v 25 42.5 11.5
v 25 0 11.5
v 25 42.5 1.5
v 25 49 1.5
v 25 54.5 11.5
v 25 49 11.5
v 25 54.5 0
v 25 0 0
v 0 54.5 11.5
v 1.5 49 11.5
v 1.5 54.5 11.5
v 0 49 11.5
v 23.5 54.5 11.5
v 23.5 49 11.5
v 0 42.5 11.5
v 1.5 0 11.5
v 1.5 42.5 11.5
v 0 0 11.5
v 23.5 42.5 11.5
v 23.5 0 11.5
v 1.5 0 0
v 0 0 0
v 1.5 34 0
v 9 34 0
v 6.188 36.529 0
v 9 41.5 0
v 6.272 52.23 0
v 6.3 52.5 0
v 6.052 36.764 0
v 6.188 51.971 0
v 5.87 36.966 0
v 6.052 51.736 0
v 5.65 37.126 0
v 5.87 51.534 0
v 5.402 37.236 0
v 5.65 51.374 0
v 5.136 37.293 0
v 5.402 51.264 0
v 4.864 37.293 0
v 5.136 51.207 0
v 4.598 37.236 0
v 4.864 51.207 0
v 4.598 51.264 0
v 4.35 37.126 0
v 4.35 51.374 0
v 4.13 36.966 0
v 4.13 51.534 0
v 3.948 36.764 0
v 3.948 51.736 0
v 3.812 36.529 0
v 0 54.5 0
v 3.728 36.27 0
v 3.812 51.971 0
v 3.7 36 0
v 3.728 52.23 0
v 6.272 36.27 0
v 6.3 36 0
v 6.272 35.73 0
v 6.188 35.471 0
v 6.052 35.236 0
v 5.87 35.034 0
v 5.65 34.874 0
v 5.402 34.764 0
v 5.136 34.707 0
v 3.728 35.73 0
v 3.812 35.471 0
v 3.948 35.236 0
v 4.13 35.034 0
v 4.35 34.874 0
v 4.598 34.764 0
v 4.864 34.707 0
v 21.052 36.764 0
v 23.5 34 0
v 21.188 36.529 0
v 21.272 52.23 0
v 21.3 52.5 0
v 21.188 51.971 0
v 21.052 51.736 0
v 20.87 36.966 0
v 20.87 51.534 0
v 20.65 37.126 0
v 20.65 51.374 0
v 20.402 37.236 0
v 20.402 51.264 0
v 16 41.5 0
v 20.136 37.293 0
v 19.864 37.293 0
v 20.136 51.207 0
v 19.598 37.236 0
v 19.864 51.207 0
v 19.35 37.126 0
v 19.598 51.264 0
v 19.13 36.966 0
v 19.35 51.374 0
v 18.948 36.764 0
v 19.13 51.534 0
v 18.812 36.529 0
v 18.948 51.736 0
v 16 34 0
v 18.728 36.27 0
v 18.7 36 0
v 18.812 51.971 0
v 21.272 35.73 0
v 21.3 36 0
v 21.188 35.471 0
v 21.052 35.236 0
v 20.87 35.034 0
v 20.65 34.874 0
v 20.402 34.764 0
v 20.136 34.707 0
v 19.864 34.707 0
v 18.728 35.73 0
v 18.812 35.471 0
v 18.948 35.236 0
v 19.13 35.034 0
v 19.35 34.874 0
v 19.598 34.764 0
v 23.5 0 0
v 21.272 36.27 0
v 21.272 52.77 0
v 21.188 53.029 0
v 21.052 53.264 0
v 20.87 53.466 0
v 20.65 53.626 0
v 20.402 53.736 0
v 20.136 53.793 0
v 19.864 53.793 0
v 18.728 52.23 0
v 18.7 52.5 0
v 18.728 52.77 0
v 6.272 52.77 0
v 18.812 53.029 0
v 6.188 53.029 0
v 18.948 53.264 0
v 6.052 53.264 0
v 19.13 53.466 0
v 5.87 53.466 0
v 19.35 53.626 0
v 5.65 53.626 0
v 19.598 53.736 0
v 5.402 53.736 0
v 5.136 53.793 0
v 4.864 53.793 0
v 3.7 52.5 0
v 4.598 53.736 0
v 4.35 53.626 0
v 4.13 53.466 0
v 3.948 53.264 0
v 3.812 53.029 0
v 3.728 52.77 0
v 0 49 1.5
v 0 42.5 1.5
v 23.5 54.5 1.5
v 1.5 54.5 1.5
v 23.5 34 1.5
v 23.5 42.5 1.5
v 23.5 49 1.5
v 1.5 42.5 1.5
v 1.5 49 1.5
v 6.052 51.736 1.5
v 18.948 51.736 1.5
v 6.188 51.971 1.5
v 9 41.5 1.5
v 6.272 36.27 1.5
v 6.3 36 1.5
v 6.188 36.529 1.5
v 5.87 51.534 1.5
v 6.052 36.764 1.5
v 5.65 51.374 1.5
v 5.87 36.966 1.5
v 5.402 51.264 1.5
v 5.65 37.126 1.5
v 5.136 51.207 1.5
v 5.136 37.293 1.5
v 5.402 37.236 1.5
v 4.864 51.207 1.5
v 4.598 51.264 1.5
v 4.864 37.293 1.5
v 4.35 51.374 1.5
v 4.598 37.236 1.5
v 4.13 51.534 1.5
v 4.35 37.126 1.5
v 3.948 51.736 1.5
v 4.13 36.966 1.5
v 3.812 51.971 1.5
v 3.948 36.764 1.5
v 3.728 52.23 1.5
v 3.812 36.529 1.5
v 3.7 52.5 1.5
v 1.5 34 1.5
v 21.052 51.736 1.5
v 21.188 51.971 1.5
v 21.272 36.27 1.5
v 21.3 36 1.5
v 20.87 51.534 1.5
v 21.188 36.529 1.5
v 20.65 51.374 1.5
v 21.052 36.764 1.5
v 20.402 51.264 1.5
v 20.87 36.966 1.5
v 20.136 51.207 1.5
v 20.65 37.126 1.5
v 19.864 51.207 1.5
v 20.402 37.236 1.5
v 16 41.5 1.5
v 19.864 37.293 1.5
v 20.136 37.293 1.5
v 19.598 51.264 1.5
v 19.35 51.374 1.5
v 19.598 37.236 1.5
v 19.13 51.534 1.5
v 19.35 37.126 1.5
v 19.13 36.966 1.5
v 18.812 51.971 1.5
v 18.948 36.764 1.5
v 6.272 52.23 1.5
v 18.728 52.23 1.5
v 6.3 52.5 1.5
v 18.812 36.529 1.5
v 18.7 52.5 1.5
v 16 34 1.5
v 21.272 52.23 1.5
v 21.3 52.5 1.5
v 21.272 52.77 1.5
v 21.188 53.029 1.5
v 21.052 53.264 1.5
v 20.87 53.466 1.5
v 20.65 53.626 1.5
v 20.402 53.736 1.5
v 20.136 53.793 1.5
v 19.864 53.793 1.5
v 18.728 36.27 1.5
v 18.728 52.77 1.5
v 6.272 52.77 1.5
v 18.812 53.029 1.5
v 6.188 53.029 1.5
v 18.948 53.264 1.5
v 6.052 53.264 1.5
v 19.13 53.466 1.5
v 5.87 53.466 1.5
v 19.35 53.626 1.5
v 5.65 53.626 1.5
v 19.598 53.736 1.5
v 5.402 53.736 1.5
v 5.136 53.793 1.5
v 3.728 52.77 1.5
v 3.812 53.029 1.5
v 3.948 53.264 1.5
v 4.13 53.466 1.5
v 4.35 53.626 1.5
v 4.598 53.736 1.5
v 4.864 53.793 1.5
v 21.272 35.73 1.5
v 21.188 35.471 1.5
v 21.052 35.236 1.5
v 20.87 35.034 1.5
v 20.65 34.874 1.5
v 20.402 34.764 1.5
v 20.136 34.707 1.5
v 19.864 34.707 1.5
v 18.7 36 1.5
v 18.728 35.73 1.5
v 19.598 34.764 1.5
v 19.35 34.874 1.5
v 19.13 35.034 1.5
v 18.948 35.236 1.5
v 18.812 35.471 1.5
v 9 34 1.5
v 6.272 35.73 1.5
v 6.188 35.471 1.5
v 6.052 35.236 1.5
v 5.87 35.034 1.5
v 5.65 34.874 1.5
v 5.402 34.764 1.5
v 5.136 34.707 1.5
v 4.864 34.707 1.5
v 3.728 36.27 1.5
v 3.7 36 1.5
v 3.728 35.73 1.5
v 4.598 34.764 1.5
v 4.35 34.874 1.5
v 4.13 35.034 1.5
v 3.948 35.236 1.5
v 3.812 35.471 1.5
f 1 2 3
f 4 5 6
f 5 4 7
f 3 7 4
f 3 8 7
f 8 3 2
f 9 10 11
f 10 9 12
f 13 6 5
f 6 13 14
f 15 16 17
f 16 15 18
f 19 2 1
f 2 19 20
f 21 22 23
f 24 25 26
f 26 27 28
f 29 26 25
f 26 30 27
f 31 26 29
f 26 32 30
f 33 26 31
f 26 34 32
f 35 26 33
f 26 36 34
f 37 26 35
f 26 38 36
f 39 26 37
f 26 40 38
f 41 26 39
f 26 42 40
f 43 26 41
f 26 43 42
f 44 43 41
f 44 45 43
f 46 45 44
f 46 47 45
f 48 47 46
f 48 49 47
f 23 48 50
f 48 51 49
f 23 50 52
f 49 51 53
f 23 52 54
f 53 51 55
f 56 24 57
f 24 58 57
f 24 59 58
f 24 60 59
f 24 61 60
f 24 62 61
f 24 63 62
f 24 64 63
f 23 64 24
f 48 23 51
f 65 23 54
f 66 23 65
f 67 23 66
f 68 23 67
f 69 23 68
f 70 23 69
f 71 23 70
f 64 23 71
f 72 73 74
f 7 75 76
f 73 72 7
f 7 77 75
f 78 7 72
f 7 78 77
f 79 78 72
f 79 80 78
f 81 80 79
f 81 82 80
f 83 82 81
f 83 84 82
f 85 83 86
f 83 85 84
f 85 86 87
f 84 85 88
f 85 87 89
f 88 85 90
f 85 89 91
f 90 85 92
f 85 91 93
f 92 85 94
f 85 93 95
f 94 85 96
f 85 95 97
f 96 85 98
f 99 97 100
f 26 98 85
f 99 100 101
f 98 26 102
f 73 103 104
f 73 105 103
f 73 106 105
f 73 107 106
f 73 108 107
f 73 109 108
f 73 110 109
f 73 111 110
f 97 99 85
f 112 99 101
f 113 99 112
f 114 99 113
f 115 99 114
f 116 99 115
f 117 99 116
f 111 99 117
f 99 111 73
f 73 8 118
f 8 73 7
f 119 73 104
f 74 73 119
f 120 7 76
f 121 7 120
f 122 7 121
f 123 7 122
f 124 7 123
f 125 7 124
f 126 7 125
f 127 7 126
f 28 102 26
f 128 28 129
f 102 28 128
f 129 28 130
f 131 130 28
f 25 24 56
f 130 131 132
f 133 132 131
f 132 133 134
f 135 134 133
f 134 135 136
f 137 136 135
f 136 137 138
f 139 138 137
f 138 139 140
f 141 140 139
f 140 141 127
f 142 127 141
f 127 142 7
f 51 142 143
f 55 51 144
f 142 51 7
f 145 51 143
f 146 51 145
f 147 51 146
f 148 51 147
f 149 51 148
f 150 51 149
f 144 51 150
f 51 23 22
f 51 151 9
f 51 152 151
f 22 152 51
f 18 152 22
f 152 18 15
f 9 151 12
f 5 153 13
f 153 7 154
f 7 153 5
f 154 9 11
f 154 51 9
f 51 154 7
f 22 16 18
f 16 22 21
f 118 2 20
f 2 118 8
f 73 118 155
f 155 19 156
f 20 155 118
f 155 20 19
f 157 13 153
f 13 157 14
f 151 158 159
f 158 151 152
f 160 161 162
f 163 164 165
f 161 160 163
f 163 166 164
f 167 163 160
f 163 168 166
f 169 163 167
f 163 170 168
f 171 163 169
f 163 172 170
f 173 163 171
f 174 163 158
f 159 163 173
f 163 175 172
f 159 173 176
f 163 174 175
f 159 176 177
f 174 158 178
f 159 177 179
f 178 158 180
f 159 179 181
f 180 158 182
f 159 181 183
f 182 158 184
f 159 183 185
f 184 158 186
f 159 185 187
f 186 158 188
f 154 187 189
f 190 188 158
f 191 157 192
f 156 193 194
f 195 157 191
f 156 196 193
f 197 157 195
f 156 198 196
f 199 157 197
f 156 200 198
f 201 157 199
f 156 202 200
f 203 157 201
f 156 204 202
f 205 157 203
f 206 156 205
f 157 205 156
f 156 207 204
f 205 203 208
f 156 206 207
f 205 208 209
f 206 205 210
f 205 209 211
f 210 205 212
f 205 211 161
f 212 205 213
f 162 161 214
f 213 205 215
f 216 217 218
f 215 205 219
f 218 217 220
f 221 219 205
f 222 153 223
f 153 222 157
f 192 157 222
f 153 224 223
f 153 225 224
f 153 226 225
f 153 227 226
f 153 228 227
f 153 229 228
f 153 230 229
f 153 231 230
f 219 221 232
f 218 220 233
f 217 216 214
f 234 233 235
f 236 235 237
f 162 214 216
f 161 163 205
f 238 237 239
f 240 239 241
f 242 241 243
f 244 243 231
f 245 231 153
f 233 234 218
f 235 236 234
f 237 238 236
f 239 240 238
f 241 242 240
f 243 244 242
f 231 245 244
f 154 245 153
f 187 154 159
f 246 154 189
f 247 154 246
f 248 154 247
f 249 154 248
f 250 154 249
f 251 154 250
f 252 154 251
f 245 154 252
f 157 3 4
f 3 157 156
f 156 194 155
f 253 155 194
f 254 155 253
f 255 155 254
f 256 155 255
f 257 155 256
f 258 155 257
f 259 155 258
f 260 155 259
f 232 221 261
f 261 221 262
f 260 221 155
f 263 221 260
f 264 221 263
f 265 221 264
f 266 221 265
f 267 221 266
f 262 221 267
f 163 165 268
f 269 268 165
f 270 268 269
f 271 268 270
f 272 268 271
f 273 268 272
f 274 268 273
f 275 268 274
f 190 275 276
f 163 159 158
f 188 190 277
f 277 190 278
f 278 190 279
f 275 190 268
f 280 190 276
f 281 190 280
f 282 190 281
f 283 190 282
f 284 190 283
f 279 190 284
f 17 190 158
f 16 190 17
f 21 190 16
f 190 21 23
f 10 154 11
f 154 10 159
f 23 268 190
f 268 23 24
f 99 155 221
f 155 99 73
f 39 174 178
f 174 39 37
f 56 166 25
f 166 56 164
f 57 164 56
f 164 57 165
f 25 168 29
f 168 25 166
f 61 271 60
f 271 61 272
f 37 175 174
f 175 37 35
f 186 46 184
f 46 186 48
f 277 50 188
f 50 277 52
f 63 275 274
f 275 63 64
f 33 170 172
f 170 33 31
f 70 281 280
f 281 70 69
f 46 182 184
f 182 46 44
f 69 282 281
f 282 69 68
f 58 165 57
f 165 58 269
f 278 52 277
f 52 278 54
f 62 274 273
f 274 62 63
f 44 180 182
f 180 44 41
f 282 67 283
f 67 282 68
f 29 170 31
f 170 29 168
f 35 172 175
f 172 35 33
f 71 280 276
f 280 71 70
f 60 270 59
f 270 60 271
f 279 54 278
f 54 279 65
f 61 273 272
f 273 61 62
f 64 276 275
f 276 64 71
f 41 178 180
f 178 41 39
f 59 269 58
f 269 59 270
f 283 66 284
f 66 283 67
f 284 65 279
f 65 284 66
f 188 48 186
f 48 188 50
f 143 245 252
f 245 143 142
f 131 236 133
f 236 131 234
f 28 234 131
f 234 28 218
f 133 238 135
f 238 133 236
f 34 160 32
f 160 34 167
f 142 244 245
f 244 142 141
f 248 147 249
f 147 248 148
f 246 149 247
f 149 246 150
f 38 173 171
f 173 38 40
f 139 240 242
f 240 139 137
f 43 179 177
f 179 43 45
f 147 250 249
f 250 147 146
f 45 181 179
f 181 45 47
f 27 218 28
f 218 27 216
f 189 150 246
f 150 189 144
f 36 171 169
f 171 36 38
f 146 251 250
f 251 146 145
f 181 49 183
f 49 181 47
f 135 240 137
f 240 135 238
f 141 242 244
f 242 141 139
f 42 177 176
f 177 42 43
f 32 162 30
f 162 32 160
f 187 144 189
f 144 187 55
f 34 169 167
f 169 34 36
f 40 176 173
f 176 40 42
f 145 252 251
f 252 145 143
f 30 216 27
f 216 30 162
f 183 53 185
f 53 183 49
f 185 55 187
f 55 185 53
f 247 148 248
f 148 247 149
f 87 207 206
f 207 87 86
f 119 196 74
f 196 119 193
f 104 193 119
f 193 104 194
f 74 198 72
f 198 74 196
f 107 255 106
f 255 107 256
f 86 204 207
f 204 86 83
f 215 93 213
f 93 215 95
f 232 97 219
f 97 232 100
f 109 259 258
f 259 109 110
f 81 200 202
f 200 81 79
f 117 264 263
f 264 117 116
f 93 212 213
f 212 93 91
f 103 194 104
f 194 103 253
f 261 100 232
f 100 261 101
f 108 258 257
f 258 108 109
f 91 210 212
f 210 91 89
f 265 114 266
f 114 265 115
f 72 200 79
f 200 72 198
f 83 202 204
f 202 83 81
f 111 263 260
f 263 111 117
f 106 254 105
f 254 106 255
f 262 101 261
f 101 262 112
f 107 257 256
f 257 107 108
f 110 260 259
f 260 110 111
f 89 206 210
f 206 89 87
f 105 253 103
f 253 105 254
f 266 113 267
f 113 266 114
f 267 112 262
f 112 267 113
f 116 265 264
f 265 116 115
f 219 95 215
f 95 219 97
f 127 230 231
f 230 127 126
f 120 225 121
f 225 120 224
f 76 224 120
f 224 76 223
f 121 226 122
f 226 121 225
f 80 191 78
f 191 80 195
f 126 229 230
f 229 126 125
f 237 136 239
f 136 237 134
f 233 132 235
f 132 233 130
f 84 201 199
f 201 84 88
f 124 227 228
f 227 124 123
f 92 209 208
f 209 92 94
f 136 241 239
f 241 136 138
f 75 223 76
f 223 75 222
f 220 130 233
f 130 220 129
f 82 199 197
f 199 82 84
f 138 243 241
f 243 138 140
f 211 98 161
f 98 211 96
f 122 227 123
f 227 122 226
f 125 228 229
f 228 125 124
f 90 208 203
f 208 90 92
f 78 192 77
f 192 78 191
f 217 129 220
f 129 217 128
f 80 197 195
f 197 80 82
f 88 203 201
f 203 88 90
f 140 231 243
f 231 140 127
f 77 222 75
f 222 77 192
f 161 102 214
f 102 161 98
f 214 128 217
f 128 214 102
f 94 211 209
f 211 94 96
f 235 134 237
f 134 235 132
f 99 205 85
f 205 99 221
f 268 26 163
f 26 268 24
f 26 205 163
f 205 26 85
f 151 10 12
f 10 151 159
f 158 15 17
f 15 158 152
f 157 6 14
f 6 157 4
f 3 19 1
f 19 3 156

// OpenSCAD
pro_micro_house_w_x = 22;
pro_micro_house_w_y = 54;
pro_micro_house_gpio_area_w_y = 34;

padding_x = 1.5;
padding_y_t = 0.5;
padding_z_t = 1.5;
padding_z_b = 1.5;

pro_micro_house_h = 1.5;
spacer_h = 7;

spacer_l_x = 3.5;
spacer_r_x = 18.5;
spacer_b_y = 36;
spacer_t_y = 52.5;
spacer_r = 1.3;

spacer_scale_inverse = 10;

trrs_y = 42.5;
trrs_w_y = 6.5;
trrs_h = 6.5;

reset_switch_x = 7.5;
reset_switch_y = 34;
reset_switch_w_x = 7;
reset_switch_w_y = 7.5;

pro_micro_house_case();

module pro_micro_house_case() {
    difference() {
        cube([pro_micro_house_w_x + 2 * padding_x, pro_micro_house_w_y + padding_y_t, pro_micro_house_h + spacer_h + padding_z_b + padding_z_t], center = false);
        translate([padding_x, 0, 0]) {
            cube([pro_micro_house_w_x, pro_micro_house_gpio_area_w_y, padding_z_b], center = false);
        }
        translate([padding_x, 0, padding_z_b]) {
            cube([pro_micro_house_w_x, pro_micro_house_w_y + padding_y_t, pro_micro_house_h + spacer_h + padding_z_t], center = false);
        }
        translate([spacer_l_x + padding_x, spacer_b_y, padding_z_b / 2]) {
            scale(1 / spacer_scale_inverse) {
                cylinder(r = spacer_scale_inverse * spacer_r, h = spacer_scale_inverse * padding_z_b, center = true);
            }
        }
        translate([spacer_l_x + padding_x, spacer_t_y, padding_z_b / 2]) {
            scale(1 / spacer_scale_inverse) {
                cylinder(r = spacer_scale_inverse * spacer_r, h = spacer_scale_inverse * padding_z_b, center = true);
            }
        }
        translate([spacer_r_x + padding_x, spacer_b_y, padding_z_b / 2]) {
            scale(1 / spacer_scale_inverse) {
                cylinder(r = spacer_scale_inverse * spacer_r, h = spacer_scale_inverse * padding_z_b, center = true);
            }
        }
        translate([spacer_r_x + padding_x, spacer_t_y, padding_z_b / 2]) {
            scale(1 / spacer_scale_inverse) {
                cylinder(r = spacer_scale_inverse * spacer_r, h = spacer_scale_inverse * padding_z_b, center = true);
            }
        }
        translate([padding_x + reset_switch_x, reset_switch_y, 0]) {
            cube([reset_switch_w_x, reset_switch_w_y, padding_z_b], center = false);
        }
        translate([0, trrs_y, padding_z_b]) {
            cube([padding_x, trrs_w_y, pro_micro_house_h + spacer_h + padding_z_t], center = false);
        }
        translate([pro_micro_house_w_x + padding_x, trrs_y, padding_z_b]) {
            cube([padding_x, trrs_w_y, pro_micro_house_h + spacer_h + padding_z_t], center = false);
        }
    }
}

module pro_micro_cube(y, w_y) {
    translate([padding_x, y - w_y, padding_z_b]) {
        cube([pro_micro_house_w_x, w_y, pro_micro_house_h + spacer_h + padding_z_t], center = false);
    }
}

module trrs_cube_l(w_x) {
    translate([-w_x + padding_x, trrs_y, padding_z_b]) {
        cube([w_x, trrs_w_y, pro_micro_house_h + spacer_h + padding_z_t], center = false);
    }
}

module trrs_cube_r(w_x) {
    translate([pro_micro_house_w_x + padding_x, trrs_y, padding_z_b]) {
        cube([w_x, trrs_w_y, pro_micro_house_h + spacer_h + padding_z_t], center = false);
    }
}
